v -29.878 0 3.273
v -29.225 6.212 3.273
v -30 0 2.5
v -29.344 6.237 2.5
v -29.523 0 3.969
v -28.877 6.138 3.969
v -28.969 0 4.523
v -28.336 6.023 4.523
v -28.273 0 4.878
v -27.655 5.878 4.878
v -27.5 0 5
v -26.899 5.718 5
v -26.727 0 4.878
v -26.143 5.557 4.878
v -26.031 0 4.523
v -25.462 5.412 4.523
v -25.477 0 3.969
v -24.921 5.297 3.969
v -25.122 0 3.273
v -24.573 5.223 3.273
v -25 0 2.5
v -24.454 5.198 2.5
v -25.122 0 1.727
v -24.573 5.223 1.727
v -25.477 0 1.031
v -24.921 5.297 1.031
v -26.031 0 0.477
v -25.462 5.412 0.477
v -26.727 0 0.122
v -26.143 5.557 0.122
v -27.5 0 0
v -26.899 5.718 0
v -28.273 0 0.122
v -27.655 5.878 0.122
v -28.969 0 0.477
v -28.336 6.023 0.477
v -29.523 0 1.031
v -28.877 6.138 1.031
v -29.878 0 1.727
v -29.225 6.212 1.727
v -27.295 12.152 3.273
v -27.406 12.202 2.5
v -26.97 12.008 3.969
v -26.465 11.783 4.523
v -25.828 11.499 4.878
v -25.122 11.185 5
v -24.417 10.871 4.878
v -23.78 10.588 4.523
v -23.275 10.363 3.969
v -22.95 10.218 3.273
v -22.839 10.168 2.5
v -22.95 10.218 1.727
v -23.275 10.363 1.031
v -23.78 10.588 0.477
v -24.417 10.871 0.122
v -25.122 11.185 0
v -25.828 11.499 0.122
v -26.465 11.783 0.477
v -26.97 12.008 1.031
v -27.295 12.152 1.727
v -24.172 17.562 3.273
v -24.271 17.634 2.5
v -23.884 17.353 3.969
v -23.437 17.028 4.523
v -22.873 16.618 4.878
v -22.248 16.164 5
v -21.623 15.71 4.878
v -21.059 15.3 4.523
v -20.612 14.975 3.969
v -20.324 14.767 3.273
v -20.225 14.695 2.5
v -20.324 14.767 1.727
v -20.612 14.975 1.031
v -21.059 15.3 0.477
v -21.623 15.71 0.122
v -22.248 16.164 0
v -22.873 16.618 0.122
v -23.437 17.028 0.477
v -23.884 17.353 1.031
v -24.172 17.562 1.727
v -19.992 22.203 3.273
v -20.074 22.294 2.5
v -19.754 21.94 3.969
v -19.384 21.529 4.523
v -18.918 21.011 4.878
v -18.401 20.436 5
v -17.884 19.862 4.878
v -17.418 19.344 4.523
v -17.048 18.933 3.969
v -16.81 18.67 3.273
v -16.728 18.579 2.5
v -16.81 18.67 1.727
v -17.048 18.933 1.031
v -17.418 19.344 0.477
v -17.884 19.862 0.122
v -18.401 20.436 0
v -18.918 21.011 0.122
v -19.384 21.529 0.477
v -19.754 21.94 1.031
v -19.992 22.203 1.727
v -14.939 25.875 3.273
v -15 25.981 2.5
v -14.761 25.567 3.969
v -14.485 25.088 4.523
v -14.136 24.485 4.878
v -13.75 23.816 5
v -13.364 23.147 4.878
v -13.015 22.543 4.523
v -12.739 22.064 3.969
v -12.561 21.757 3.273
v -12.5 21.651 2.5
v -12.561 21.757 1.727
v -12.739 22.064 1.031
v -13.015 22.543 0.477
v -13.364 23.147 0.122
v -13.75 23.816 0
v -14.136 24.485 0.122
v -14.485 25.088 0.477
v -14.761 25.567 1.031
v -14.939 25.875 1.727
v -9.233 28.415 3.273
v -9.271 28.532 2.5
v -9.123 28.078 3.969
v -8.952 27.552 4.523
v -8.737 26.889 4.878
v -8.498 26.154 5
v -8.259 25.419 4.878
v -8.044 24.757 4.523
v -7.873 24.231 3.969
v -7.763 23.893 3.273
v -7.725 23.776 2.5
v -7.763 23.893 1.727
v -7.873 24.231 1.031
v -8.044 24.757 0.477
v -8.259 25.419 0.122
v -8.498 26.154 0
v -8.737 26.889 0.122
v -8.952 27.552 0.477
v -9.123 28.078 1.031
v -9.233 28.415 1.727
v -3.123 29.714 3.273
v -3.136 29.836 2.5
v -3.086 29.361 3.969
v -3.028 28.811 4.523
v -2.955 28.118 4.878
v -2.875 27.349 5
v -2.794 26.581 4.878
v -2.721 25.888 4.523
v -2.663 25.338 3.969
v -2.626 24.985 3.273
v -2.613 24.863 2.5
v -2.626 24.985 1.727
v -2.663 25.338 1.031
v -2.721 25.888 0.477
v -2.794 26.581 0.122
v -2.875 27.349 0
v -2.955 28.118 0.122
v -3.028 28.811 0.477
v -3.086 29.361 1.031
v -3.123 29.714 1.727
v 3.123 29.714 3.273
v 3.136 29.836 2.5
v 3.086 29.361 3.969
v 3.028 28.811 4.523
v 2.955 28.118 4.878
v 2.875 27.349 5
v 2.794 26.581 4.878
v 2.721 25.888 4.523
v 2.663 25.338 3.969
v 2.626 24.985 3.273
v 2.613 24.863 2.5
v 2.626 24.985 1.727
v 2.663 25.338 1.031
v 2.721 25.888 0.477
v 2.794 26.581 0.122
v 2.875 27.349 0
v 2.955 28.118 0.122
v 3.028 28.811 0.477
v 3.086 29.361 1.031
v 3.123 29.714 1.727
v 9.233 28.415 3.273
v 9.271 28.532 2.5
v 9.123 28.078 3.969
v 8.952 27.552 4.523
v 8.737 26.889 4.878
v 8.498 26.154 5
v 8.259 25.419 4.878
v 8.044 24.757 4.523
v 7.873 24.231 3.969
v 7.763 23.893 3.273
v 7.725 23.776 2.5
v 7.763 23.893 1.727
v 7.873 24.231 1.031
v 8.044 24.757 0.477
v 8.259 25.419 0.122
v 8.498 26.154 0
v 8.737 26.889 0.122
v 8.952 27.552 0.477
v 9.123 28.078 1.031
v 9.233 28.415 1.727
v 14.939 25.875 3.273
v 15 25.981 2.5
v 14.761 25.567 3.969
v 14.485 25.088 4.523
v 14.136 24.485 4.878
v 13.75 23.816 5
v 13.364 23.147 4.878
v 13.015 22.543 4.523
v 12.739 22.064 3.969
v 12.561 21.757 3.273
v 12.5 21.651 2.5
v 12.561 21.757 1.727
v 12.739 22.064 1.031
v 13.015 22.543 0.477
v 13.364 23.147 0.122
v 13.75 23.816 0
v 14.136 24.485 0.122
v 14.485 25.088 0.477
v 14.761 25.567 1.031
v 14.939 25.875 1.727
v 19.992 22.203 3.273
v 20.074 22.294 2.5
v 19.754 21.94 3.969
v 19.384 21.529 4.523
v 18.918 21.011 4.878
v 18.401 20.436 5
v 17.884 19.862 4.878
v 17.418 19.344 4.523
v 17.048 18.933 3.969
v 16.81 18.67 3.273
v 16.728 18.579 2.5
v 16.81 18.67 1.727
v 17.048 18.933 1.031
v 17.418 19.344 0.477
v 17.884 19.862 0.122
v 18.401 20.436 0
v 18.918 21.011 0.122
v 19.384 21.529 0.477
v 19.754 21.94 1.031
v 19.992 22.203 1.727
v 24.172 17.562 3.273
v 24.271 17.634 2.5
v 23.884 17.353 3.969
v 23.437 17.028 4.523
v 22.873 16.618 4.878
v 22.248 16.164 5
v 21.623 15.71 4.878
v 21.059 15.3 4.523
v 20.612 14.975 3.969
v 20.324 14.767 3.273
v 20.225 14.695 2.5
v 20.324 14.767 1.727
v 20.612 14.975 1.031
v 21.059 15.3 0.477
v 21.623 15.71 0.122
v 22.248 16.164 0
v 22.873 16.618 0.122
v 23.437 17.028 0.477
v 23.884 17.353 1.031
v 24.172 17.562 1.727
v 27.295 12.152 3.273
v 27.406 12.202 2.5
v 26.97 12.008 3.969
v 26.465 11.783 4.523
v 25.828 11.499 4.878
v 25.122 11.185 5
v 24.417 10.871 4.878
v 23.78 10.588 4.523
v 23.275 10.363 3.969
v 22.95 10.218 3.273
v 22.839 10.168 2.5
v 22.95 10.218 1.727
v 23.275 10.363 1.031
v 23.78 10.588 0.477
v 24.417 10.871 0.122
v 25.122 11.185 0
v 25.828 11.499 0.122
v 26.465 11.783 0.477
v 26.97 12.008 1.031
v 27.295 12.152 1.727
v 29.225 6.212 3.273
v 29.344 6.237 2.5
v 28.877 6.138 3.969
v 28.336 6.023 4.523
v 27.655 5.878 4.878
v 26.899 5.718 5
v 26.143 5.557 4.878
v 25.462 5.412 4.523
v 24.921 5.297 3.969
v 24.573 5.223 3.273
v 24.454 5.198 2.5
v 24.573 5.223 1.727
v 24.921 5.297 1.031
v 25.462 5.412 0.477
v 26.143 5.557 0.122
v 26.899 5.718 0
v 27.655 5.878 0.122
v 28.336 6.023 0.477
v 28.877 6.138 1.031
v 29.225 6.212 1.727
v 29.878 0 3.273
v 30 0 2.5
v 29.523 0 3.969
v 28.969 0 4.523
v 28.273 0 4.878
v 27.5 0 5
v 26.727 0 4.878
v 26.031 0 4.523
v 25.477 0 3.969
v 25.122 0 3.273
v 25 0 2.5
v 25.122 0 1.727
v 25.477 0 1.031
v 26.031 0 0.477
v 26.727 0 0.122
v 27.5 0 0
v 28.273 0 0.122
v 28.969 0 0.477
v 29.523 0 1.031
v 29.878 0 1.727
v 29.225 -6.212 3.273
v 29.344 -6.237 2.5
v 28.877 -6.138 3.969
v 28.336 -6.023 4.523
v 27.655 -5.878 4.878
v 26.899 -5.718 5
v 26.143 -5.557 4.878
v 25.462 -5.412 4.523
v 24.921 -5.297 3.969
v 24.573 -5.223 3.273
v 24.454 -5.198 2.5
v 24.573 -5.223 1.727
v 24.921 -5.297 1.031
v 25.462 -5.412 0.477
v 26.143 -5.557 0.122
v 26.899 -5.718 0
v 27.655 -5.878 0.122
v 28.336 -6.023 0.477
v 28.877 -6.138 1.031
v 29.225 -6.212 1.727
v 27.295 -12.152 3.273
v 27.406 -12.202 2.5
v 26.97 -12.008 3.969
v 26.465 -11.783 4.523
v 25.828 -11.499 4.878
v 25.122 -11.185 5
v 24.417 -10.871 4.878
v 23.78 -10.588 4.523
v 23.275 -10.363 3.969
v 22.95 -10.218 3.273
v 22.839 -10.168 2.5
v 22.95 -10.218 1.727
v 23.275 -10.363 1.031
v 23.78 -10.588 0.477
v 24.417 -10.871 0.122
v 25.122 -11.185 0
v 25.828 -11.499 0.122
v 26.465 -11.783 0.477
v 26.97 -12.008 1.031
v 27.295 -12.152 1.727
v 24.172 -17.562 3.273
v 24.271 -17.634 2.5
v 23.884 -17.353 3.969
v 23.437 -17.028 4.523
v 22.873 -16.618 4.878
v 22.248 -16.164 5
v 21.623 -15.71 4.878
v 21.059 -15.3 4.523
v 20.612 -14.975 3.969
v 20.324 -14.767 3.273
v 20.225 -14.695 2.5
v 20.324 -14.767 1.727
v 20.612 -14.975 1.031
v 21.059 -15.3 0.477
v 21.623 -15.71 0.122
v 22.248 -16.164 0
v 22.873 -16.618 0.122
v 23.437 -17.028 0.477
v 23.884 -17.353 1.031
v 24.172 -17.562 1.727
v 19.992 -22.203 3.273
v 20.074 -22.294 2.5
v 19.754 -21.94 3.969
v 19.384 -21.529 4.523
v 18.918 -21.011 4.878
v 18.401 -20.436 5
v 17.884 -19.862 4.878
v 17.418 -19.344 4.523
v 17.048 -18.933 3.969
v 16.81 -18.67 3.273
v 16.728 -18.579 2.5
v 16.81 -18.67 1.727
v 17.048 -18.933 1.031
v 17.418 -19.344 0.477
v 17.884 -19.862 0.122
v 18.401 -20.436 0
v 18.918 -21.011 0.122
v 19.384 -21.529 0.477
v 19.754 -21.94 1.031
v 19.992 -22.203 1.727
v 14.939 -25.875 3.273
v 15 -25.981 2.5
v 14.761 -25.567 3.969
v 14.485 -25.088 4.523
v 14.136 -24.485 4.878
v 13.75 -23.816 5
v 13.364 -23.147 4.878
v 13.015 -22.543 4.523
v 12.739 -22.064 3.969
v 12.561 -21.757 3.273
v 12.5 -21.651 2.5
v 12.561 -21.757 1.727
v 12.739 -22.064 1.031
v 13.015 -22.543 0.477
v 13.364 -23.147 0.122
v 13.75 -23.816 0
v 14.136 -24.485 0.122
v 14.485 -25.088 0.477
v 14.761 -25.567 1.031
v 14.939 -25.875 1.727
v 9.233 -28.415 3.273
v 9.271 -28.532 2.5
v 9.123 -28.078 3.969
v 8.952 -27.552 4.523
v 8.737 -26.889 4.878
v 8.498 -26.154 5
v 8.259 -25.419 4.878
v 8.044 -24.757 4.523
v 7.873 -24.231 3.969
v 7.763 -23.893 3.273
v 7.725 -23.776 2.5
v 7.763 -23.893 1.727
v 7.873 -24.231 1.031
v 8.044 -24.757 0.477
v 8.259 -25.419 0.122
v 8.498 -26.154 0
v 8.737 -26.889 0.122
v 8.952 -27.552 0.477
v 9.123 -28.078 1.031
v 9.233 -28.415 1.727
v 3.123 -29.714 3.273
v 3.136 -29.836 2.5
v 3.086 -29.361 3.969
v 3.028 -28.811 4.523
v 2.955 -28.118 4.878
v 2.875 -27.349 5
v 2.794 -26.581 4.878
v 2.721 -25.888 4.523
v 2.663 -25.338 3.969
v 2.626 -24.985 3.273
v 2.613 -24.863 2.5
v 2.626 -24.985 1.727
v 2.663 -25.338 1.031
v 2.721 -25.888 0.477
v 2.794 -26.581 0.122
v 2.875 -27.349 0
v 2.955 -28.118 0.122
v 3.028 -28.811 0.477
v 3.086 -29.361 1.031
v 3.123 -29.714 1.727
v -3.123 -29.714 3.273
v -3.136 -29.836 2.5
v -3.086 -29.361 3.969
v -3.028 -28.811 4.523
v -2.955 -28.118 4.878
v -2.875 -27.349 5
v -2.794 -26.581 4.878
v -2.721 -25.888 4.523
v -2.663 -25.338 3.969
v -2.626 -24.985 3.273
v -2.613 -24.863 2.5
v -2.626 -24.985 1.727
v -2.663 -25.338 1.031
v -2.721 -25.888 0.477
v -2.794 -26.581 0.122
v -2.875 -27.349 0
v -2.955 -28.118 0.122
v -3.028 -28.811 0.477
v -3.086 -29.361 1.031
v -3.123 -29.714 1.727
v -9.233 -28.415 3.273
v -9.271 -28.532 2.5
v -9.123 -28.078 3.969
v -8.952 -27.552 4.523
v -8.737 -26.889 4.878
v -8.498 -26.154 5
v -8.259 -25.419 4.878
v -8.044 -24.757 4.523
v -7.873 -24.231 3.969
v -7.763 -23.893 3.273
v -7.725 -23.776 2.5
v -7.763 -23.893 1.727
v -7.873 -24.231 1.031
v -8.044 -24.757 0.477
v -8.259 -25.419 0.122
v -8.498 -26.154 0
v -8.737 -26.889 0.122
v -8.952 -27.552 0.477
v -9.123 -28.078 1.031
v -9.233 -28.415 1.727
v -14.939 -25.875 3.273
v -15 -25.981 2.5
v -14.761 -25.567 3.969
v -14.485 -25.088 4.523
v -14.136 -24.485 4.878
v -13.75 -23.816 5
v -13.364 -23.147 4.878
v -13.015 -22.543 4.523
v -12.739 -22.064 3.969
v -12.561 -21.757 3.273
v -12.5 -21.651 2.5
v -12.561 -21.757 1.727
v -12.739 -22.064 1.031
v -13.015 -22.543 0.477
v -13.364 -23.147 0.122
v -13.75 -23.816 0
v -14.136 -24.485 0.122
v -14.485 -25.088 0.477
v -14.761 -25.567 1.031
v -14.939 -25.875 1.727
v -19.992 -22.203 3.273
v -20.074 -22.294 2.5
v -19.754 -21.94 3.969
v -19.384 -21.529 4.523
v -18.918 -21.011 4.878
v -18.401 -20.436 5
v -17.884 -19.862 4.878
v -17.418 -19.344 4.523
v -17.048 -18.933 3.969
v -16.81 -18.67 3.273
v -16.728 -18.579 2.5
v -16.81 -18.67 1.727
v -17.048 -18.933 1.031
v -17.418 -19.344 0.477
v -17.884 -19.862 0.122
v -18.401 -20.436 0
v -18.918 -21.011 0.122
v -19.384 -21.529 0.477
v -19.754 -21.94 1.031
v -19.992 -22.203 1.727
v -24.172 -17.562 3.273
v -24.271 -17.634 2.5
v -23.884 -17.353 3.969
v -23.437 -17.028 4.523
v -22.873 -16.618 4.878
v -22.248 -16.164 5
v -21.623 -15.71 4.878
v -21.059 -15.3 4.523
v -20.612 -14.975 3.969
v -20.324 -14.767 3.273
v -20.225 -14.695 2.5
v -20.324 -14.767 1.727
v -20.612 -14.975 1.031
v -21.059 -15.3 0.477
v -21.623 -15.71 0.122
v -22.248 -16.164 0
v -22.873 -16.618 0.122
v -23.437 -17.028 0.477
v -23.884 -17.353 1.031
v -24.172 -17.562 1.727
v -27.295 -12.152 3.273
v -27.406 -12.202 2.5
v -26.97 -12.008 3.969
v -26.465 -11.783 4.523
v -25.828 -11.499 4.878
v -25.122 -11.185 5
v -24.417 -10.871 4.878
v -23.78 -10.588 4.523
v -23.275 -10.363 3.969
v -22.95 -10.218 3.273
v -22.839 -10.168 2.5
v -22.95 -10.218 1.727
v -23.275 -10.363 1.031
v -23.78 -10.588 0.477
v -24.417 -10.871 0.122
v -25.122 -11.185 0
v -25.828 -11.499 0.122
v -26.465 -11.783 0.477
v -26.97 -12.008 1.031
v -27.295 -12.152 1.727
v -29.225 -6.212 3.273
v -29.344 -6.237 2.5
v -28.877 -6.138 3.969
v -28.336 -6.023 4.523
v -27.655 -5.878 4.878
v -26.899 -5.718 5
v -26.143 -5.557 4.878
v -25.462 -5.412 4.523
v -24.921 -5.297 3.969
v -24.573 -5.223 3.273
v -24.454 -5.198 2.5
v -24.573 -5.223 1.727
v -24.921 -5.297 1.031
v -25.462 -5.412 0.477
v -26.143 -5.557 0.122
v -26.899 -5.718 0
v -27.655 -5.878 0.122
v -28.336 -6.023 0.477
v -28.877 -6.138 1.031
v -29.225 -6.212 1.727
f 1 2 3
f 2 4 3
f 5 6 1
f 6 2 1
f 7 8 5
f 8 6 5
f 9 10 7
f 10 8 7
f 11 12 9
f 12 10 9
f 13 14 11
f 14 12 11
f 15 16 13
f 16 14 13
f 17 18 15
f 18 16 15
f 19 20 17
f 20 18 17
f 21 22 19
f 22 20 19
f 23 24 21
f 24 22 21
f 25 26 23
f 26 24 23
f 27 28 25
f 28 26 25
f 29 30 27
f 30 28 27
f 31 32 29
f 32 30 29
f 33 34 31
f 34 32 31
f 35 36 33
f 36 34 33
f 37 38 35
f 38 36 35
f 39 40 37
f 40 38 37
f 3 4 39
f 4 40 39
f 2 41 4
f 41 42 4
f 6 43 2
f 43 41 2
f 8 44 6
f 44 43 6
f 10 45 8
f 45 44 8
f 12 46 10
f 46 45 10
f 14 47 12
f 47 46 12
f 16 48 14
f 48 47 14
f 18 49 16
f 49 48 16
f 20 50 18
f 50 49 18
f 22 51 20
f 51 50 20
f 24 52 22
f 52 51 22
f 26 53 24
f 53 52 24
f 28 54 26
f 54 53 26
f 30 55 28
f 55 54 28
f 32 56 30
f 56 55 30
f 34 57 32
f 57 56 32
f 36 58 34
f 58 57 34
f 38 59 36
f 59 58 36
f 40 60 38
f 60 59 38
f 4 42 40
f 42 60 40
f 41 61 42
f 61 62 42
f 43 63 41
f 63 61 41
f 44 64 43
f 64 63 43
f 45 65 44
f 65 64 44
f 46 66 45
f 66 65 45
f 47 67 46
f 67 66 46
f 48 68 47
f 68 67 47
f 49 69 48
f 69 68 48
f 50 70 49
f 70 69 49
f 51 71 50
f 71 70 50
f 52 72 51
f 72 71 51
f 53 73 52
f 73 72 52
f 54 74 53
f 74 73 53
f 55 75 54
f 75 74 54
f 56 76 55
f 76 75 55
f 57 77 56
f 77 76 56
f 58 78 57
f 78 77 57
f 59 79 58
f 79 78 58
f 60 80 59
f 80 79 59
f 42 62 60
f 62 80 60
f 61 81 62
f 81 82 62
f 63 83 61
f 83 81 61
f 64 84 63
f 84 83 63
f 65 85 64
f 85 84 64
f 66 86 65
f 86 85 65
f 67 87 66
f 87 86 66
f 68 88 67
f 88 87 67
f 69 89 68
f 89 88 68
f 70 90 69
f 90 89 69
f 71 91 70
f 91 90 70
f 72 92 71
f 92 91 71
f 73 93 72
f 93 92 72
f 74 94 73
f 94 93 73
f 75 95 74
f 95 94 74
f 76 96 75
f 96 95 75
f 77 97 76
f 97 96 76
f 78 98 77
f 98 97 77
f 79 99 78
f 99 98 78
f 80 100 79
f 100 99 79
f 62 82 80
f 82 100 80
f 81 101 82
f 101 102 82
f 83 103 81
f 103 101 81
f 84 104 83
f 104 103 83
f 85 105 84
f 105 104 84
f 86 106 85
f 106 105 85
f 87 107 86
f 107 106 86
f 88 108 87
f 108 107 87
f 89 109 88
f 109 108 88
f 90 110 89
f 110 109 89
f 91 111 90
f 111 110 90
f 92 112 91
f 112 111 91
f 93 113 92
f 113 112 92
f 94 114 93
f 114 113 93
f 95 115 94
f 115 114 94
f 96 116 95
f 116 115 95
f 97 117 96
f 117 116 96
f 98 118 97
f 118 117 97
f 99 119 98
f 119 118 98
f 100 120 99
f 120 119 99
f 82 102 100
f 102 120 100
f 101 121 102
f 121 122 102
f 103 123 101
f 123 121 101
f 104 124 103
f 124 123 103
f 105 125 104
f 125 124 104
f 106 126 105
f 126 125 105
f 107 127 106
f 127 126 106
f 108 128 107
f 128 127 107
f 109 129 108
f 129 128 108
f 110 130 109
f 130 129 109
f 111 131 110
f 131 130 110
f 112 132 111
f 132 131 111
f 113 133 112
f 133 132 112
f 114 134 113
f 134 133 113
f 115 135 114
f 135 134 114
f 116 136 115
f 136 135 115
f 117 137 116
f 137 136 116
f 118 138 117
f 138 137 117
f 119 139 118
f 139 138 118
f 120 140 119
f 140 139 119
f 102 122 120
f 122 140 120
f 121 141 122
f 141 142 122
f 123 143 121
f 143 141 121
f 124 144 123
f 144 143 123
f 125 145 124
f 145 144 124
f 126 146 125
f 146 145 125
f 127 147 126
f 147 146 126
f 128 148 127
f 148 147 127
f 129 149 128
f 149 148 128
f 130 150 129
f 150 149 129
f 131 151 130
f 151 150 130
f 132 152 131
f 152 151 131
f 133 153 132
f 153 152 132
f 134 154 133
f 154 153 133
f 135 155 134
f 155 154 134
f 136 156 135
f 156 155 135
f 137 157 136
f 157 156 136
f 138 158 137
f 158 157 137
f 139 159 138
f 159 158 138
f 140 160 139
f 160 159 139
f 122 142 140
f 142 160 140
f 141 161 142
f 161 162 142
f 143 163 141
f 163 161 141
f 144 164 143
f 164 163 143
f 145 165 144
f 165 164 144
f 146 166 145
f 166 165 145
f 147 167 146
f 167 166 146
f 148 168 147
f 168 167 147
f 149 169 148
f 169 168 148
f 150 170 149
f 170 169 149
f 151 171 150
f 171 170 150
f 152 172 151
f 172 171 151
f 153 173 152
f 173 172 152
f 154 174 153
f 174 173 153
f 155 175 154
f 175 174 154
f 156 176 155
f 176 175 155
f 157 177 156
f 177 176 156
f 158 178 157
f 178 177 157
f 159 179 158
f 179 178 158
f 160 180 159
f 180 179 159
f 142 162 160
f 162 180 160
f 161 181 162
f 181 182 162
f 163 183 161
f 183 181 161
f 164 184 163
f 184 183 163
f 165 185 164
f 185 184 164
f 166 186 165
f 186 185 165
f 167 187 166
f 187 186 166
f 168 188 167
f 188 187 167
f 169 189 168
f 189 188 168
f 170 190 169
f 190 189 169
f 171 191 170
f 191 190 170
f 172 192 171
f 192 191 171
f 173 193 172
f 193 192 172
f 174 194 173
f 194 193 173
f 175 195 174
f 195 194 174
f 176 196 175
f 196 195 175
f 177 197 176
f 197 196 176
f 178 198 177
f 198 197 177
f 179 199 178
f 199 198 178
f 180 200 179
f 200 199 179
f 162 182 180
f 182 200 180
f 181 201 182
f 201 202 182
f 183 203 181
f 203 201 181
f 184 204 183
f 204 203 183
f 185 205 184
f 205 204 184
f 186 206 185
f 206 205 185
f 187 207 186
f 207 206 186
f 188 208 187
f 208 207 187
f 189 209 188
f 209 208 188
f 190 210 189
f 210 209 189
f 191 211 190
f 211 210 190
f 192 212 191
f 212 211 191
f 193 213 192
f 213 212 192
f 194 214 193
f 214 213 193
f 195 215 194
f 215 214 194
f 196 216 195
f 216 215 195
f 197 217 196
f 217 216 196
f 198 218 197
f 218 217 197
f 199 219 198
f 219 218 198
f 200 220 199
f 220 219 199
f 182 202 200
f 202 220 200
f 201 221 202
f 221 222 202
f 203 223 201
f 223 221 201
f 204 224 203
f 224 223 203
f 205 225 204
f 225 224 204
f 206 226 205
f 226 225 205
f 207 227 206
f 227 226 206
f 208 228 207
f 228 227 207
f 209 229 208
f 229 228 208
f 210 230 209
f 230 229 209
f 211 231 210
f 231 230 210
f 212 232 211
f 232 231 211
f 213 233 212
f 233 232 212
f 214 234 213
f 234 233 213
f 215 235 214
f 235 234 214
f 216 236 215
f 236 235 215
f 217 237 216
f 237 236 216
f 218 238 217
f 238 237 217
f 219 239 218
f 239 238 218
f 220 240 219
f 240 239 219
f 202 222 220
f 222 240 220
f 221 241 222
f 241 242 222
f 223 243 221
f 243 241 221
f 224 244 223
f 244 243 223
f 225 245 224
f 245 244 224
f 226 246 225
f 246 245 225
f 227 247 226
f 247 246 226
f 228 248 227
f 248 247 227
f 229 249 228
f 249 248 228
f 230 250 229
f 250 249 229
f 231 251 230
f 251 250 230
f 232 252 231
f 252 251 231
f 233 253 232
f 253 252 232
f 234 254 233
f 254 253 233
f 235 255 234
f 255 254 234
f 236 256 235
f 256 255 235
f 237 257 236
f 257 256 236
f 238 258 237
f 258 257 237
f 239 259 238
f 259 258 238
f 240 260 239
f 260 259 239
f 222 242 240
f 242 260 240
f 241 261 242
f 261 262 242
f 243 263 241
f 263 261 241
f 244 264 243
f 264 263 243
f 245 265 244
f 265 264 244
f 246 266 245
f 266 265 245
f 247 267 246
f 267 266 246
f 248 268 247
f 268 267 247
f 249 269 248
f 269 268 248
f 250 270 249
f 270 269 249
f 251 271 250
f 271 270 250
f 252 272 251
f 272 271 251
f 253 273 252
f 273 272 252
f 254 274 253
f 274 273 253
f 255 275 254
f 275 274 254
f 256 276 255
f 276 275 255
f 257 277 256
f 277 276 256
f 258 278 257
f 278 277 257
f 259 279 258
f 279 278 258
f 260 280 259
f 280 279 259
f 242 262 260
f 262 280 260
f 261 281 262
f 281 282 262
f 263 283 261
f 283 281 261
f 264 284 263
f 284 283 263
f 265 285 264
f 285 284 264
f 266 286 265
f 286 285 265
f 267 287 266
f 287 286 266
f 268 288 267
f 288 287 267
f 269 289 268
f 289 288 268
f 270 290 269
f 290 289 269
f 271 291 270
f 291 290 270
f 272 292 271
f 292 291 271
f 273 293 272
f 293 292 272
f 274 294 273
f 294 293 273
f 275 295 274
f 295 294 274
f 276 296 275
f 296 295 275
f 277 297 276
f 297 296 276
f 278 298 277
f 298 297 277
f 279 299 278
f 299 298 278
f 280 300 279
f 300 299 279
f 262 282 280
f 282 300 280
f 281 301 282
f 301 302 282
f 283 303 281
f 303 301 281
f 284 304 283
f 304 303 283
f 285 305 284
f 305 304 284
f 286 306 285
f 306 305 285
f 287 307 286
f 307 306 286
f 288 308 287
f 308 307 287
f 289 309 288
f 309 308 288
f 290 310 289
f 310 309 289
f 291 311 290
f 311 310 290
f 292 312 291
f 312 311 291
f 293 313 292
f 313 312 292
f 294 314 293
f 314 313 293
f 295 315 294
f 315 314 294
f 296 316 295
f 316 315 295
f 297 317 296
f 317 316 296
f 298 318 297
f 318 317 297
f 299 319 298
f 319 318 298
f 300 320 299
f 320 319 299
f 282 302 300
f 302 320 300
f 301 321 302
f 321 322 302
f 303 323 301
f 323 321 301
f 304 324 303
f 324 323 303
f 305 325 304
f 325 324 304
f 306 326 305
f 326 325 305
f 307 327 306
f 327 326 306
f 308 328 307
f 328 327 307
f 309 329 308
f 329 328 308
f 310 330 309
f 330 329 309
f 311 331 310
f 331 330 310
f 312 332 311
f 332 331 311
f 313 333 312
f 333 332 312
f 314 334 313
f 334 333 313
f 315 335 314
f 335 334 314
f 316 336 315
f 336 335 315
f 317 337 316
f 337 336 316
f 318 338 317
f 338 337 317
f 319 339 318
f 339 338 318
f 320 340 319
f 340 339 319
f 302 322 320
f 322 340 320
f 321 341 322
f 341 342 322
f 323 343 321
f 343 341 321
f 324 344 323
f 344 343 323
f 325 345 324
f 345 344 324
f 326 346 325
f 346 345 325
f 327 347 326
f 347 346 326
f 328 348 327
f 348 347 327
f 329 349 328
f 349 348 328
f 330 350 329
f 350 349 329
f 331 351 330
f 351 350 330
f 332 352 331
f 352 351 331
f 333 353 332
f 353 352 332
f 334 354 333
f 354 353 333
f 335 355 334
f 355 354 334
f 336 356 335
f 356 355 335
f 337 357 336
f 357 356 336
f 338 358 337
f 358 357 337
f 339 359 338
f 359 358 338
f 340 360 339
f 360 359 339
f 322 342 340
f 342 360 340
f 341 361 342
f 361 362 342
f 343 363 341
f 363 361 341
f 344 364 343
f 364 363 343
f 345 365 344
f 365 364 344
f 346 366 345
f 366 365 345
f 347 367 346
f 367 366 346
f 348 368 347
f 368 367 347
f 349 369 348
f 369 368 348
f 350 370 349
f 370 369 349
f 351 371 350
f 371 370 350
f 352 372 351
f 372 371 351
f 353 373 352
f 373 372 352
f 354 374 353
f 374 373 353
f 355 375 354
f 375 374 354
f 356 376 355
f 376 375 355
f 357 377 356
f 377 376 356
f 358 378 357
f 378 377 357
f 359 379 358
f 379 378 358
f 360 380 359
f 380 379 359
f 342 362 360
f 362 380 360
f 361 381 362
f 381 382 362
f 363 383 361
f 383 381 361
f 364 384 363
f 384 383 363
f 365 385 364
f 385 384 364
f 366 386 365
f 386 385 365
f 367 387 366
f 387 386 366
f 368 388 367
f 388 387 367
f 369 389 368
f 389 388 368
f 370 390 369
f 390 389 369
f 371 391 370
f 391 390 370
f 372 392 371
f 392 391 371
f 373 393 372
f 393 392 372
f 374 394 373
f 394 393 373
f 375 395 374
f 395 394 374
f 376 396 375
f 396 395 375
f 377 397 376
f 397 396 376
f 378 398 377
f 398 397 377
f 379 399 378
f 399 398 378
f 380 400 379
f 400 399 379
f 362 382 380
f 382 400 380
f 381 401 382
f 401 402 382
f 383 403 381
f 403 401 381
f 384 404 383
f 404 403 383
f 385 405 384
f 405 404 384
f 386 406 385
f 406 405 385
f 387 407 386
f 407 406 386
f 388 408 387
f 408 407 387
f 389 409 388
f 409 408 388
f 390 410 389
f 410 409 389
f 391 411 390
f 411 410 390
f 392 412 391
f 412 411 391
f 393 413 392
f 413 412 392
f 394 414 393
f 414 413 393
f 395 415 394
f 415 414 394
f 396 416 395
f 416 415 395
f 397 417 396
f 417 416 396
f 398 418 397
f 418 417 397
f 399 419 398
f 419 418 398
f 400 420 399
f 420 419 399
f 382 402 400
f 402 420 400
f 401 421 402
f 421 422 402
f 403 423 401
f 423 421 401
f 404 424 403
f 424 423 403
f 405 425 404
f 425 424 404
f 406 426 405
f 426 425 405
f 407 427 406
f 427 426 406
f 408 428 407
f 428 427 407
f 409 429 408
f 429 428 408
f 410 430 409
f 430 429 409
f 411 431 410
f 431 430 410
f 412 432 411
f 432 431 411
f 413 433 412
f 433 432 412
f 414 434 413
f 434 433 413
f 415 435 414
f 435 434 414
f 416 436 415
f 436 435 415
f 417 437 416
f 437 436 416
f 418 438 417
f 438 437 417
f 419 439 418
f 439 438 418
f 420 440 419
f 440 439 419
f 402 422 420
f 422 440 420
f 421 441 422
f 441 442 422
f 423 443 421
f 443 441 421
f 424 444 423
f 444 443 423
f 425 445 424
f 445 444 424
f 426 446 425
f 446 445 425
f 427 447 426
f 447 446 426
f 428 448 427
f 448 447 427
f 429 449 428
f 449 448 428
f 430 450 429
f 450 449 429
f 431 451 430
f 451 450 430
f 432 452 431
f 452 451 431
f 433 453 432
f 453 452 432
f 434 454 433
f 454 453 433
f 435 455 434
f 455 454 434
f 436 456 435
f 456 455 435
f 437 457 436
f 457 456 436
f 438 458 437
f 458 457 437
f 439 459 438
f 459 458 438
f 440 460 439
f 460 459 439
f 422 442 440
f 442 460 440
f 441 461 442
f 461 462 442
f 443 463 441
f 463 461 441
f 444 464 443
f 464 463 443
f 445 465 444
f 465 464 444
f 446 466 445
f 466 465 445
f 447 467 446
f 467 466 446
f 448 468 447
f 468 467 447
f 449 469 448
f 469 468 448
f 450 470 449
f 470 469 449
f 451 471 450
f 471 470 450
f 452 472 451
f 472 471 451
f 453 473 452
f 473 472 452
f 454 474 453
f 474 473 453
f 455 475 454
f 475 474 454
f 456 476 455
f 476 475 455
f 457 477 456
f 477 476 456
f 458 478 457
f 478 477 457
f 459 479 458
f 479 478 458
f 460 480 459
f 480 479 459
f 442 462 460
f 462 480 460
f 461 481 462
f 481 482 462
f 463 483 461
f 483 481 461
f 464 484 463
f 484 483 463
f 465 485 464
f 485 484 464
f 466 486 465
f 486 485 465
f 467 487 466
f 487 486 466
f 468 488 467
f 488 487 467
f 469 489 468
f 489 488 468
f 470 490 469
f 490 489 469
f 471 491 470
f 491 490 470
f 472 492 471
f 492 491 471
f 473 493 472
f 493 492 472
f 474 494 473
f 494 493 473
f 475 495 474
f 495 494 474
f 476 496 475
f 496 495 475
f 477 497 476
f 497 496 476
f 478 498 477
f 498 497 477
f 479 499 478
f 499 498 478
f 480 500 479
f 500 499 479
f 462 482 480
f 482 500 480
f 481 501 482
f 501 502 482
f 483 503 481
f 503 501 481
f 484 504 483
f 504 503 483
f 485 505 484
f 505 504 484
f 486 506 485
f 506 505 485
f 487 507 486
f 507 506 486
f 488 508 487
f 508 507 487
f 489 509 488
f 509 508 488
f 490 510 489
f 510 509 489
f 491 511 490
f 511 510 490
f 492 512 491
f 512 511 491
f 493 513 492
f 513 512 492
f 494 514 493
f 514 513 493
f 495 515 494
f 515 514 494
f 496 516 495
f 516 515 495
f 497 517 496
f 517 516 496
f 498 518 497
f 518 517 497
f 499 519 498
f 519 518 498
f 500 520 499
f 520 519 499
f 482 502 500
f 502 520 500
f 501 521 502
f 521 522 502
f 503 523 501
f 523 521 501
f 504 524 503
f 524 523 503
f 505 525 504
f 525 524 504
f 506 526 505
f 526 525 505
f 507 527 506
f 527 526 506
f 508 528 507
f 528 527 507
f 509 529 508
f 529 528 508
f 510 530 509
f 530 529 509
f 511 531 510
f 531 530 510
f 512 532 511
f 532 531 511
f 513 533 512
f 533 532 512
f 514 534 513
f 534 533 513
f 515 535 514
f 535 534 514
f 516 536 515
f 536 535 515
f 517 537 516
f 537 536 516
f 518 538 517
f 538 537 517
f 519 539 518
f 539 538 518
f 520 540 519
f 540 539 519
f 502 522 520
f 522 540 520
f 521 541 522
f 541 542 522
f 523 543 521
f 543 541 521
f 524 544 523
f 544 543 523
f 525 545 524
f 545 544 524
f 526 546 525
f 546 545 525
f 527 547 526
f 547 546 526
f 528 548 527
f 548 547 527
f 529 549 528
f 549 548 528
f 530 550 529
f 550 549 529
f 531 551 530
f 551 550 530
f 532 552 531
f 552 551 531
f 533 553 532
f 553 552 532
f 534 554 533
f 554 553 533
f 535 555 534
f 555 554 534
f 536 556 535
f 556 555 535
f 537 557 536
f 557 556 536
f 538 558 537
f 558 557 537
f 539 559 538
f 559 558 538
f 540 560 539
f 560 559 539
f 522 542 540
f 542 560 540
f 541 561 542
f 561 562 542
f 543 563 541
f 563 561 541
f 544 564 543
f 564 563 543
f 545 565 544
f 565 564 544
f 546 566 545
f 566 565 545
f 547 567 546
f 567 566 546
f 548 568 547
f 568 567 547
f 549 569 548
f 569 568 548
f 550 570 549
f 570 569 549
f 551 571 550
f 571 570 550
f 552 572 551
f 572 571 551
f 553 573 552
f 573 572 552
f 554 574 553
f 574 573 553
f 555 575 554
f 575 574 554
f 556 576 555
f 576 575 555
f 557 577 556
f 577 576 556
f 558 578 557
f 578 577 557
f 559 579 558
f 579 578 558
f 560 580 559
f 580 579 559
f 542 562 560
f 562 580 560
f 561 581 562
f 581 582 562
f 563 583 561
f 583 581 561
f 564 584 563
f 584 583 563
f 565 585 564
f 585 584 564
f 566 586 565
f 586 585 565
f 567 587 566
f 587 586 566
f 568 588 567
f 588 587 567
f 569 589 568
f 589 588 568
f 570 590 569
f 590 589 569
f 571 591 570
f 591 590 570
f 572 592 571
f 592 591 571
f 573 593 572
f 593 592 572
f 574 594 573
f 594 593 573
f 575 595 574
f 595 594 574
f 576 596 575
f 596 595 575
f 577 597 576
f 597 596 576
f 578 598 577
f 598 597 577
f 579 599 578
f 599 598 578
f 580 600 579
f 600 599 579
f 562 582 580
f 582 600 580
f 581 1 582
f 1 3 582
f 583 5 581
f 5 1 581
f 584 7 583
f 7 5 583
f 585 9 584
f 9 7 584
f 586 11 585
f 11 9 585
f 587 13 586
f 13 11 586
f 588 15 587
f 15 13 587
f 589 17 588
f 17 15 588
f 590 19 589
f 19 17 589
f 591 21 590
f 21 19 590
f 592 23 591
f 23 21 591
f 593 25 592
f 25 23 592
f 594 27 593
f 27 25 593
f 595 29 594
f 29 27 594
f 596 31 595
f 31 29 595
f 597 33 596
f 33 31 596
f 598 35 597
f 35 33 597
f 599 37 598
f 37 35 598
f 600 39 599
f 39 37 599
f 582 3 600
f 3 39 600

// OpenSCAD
// NAME: O Ring 50 x 5
// CATEGORY: Wheel
// COLOR: 0

module o_ring_50(){
    rotate_extrude(convexity = 2)
        translate([(50+5)/2, 0, 0])
        circle(d = 5, $fn=20);
}

translate([0, 0, 2.5])
    color("black")
    o_ring_50();
